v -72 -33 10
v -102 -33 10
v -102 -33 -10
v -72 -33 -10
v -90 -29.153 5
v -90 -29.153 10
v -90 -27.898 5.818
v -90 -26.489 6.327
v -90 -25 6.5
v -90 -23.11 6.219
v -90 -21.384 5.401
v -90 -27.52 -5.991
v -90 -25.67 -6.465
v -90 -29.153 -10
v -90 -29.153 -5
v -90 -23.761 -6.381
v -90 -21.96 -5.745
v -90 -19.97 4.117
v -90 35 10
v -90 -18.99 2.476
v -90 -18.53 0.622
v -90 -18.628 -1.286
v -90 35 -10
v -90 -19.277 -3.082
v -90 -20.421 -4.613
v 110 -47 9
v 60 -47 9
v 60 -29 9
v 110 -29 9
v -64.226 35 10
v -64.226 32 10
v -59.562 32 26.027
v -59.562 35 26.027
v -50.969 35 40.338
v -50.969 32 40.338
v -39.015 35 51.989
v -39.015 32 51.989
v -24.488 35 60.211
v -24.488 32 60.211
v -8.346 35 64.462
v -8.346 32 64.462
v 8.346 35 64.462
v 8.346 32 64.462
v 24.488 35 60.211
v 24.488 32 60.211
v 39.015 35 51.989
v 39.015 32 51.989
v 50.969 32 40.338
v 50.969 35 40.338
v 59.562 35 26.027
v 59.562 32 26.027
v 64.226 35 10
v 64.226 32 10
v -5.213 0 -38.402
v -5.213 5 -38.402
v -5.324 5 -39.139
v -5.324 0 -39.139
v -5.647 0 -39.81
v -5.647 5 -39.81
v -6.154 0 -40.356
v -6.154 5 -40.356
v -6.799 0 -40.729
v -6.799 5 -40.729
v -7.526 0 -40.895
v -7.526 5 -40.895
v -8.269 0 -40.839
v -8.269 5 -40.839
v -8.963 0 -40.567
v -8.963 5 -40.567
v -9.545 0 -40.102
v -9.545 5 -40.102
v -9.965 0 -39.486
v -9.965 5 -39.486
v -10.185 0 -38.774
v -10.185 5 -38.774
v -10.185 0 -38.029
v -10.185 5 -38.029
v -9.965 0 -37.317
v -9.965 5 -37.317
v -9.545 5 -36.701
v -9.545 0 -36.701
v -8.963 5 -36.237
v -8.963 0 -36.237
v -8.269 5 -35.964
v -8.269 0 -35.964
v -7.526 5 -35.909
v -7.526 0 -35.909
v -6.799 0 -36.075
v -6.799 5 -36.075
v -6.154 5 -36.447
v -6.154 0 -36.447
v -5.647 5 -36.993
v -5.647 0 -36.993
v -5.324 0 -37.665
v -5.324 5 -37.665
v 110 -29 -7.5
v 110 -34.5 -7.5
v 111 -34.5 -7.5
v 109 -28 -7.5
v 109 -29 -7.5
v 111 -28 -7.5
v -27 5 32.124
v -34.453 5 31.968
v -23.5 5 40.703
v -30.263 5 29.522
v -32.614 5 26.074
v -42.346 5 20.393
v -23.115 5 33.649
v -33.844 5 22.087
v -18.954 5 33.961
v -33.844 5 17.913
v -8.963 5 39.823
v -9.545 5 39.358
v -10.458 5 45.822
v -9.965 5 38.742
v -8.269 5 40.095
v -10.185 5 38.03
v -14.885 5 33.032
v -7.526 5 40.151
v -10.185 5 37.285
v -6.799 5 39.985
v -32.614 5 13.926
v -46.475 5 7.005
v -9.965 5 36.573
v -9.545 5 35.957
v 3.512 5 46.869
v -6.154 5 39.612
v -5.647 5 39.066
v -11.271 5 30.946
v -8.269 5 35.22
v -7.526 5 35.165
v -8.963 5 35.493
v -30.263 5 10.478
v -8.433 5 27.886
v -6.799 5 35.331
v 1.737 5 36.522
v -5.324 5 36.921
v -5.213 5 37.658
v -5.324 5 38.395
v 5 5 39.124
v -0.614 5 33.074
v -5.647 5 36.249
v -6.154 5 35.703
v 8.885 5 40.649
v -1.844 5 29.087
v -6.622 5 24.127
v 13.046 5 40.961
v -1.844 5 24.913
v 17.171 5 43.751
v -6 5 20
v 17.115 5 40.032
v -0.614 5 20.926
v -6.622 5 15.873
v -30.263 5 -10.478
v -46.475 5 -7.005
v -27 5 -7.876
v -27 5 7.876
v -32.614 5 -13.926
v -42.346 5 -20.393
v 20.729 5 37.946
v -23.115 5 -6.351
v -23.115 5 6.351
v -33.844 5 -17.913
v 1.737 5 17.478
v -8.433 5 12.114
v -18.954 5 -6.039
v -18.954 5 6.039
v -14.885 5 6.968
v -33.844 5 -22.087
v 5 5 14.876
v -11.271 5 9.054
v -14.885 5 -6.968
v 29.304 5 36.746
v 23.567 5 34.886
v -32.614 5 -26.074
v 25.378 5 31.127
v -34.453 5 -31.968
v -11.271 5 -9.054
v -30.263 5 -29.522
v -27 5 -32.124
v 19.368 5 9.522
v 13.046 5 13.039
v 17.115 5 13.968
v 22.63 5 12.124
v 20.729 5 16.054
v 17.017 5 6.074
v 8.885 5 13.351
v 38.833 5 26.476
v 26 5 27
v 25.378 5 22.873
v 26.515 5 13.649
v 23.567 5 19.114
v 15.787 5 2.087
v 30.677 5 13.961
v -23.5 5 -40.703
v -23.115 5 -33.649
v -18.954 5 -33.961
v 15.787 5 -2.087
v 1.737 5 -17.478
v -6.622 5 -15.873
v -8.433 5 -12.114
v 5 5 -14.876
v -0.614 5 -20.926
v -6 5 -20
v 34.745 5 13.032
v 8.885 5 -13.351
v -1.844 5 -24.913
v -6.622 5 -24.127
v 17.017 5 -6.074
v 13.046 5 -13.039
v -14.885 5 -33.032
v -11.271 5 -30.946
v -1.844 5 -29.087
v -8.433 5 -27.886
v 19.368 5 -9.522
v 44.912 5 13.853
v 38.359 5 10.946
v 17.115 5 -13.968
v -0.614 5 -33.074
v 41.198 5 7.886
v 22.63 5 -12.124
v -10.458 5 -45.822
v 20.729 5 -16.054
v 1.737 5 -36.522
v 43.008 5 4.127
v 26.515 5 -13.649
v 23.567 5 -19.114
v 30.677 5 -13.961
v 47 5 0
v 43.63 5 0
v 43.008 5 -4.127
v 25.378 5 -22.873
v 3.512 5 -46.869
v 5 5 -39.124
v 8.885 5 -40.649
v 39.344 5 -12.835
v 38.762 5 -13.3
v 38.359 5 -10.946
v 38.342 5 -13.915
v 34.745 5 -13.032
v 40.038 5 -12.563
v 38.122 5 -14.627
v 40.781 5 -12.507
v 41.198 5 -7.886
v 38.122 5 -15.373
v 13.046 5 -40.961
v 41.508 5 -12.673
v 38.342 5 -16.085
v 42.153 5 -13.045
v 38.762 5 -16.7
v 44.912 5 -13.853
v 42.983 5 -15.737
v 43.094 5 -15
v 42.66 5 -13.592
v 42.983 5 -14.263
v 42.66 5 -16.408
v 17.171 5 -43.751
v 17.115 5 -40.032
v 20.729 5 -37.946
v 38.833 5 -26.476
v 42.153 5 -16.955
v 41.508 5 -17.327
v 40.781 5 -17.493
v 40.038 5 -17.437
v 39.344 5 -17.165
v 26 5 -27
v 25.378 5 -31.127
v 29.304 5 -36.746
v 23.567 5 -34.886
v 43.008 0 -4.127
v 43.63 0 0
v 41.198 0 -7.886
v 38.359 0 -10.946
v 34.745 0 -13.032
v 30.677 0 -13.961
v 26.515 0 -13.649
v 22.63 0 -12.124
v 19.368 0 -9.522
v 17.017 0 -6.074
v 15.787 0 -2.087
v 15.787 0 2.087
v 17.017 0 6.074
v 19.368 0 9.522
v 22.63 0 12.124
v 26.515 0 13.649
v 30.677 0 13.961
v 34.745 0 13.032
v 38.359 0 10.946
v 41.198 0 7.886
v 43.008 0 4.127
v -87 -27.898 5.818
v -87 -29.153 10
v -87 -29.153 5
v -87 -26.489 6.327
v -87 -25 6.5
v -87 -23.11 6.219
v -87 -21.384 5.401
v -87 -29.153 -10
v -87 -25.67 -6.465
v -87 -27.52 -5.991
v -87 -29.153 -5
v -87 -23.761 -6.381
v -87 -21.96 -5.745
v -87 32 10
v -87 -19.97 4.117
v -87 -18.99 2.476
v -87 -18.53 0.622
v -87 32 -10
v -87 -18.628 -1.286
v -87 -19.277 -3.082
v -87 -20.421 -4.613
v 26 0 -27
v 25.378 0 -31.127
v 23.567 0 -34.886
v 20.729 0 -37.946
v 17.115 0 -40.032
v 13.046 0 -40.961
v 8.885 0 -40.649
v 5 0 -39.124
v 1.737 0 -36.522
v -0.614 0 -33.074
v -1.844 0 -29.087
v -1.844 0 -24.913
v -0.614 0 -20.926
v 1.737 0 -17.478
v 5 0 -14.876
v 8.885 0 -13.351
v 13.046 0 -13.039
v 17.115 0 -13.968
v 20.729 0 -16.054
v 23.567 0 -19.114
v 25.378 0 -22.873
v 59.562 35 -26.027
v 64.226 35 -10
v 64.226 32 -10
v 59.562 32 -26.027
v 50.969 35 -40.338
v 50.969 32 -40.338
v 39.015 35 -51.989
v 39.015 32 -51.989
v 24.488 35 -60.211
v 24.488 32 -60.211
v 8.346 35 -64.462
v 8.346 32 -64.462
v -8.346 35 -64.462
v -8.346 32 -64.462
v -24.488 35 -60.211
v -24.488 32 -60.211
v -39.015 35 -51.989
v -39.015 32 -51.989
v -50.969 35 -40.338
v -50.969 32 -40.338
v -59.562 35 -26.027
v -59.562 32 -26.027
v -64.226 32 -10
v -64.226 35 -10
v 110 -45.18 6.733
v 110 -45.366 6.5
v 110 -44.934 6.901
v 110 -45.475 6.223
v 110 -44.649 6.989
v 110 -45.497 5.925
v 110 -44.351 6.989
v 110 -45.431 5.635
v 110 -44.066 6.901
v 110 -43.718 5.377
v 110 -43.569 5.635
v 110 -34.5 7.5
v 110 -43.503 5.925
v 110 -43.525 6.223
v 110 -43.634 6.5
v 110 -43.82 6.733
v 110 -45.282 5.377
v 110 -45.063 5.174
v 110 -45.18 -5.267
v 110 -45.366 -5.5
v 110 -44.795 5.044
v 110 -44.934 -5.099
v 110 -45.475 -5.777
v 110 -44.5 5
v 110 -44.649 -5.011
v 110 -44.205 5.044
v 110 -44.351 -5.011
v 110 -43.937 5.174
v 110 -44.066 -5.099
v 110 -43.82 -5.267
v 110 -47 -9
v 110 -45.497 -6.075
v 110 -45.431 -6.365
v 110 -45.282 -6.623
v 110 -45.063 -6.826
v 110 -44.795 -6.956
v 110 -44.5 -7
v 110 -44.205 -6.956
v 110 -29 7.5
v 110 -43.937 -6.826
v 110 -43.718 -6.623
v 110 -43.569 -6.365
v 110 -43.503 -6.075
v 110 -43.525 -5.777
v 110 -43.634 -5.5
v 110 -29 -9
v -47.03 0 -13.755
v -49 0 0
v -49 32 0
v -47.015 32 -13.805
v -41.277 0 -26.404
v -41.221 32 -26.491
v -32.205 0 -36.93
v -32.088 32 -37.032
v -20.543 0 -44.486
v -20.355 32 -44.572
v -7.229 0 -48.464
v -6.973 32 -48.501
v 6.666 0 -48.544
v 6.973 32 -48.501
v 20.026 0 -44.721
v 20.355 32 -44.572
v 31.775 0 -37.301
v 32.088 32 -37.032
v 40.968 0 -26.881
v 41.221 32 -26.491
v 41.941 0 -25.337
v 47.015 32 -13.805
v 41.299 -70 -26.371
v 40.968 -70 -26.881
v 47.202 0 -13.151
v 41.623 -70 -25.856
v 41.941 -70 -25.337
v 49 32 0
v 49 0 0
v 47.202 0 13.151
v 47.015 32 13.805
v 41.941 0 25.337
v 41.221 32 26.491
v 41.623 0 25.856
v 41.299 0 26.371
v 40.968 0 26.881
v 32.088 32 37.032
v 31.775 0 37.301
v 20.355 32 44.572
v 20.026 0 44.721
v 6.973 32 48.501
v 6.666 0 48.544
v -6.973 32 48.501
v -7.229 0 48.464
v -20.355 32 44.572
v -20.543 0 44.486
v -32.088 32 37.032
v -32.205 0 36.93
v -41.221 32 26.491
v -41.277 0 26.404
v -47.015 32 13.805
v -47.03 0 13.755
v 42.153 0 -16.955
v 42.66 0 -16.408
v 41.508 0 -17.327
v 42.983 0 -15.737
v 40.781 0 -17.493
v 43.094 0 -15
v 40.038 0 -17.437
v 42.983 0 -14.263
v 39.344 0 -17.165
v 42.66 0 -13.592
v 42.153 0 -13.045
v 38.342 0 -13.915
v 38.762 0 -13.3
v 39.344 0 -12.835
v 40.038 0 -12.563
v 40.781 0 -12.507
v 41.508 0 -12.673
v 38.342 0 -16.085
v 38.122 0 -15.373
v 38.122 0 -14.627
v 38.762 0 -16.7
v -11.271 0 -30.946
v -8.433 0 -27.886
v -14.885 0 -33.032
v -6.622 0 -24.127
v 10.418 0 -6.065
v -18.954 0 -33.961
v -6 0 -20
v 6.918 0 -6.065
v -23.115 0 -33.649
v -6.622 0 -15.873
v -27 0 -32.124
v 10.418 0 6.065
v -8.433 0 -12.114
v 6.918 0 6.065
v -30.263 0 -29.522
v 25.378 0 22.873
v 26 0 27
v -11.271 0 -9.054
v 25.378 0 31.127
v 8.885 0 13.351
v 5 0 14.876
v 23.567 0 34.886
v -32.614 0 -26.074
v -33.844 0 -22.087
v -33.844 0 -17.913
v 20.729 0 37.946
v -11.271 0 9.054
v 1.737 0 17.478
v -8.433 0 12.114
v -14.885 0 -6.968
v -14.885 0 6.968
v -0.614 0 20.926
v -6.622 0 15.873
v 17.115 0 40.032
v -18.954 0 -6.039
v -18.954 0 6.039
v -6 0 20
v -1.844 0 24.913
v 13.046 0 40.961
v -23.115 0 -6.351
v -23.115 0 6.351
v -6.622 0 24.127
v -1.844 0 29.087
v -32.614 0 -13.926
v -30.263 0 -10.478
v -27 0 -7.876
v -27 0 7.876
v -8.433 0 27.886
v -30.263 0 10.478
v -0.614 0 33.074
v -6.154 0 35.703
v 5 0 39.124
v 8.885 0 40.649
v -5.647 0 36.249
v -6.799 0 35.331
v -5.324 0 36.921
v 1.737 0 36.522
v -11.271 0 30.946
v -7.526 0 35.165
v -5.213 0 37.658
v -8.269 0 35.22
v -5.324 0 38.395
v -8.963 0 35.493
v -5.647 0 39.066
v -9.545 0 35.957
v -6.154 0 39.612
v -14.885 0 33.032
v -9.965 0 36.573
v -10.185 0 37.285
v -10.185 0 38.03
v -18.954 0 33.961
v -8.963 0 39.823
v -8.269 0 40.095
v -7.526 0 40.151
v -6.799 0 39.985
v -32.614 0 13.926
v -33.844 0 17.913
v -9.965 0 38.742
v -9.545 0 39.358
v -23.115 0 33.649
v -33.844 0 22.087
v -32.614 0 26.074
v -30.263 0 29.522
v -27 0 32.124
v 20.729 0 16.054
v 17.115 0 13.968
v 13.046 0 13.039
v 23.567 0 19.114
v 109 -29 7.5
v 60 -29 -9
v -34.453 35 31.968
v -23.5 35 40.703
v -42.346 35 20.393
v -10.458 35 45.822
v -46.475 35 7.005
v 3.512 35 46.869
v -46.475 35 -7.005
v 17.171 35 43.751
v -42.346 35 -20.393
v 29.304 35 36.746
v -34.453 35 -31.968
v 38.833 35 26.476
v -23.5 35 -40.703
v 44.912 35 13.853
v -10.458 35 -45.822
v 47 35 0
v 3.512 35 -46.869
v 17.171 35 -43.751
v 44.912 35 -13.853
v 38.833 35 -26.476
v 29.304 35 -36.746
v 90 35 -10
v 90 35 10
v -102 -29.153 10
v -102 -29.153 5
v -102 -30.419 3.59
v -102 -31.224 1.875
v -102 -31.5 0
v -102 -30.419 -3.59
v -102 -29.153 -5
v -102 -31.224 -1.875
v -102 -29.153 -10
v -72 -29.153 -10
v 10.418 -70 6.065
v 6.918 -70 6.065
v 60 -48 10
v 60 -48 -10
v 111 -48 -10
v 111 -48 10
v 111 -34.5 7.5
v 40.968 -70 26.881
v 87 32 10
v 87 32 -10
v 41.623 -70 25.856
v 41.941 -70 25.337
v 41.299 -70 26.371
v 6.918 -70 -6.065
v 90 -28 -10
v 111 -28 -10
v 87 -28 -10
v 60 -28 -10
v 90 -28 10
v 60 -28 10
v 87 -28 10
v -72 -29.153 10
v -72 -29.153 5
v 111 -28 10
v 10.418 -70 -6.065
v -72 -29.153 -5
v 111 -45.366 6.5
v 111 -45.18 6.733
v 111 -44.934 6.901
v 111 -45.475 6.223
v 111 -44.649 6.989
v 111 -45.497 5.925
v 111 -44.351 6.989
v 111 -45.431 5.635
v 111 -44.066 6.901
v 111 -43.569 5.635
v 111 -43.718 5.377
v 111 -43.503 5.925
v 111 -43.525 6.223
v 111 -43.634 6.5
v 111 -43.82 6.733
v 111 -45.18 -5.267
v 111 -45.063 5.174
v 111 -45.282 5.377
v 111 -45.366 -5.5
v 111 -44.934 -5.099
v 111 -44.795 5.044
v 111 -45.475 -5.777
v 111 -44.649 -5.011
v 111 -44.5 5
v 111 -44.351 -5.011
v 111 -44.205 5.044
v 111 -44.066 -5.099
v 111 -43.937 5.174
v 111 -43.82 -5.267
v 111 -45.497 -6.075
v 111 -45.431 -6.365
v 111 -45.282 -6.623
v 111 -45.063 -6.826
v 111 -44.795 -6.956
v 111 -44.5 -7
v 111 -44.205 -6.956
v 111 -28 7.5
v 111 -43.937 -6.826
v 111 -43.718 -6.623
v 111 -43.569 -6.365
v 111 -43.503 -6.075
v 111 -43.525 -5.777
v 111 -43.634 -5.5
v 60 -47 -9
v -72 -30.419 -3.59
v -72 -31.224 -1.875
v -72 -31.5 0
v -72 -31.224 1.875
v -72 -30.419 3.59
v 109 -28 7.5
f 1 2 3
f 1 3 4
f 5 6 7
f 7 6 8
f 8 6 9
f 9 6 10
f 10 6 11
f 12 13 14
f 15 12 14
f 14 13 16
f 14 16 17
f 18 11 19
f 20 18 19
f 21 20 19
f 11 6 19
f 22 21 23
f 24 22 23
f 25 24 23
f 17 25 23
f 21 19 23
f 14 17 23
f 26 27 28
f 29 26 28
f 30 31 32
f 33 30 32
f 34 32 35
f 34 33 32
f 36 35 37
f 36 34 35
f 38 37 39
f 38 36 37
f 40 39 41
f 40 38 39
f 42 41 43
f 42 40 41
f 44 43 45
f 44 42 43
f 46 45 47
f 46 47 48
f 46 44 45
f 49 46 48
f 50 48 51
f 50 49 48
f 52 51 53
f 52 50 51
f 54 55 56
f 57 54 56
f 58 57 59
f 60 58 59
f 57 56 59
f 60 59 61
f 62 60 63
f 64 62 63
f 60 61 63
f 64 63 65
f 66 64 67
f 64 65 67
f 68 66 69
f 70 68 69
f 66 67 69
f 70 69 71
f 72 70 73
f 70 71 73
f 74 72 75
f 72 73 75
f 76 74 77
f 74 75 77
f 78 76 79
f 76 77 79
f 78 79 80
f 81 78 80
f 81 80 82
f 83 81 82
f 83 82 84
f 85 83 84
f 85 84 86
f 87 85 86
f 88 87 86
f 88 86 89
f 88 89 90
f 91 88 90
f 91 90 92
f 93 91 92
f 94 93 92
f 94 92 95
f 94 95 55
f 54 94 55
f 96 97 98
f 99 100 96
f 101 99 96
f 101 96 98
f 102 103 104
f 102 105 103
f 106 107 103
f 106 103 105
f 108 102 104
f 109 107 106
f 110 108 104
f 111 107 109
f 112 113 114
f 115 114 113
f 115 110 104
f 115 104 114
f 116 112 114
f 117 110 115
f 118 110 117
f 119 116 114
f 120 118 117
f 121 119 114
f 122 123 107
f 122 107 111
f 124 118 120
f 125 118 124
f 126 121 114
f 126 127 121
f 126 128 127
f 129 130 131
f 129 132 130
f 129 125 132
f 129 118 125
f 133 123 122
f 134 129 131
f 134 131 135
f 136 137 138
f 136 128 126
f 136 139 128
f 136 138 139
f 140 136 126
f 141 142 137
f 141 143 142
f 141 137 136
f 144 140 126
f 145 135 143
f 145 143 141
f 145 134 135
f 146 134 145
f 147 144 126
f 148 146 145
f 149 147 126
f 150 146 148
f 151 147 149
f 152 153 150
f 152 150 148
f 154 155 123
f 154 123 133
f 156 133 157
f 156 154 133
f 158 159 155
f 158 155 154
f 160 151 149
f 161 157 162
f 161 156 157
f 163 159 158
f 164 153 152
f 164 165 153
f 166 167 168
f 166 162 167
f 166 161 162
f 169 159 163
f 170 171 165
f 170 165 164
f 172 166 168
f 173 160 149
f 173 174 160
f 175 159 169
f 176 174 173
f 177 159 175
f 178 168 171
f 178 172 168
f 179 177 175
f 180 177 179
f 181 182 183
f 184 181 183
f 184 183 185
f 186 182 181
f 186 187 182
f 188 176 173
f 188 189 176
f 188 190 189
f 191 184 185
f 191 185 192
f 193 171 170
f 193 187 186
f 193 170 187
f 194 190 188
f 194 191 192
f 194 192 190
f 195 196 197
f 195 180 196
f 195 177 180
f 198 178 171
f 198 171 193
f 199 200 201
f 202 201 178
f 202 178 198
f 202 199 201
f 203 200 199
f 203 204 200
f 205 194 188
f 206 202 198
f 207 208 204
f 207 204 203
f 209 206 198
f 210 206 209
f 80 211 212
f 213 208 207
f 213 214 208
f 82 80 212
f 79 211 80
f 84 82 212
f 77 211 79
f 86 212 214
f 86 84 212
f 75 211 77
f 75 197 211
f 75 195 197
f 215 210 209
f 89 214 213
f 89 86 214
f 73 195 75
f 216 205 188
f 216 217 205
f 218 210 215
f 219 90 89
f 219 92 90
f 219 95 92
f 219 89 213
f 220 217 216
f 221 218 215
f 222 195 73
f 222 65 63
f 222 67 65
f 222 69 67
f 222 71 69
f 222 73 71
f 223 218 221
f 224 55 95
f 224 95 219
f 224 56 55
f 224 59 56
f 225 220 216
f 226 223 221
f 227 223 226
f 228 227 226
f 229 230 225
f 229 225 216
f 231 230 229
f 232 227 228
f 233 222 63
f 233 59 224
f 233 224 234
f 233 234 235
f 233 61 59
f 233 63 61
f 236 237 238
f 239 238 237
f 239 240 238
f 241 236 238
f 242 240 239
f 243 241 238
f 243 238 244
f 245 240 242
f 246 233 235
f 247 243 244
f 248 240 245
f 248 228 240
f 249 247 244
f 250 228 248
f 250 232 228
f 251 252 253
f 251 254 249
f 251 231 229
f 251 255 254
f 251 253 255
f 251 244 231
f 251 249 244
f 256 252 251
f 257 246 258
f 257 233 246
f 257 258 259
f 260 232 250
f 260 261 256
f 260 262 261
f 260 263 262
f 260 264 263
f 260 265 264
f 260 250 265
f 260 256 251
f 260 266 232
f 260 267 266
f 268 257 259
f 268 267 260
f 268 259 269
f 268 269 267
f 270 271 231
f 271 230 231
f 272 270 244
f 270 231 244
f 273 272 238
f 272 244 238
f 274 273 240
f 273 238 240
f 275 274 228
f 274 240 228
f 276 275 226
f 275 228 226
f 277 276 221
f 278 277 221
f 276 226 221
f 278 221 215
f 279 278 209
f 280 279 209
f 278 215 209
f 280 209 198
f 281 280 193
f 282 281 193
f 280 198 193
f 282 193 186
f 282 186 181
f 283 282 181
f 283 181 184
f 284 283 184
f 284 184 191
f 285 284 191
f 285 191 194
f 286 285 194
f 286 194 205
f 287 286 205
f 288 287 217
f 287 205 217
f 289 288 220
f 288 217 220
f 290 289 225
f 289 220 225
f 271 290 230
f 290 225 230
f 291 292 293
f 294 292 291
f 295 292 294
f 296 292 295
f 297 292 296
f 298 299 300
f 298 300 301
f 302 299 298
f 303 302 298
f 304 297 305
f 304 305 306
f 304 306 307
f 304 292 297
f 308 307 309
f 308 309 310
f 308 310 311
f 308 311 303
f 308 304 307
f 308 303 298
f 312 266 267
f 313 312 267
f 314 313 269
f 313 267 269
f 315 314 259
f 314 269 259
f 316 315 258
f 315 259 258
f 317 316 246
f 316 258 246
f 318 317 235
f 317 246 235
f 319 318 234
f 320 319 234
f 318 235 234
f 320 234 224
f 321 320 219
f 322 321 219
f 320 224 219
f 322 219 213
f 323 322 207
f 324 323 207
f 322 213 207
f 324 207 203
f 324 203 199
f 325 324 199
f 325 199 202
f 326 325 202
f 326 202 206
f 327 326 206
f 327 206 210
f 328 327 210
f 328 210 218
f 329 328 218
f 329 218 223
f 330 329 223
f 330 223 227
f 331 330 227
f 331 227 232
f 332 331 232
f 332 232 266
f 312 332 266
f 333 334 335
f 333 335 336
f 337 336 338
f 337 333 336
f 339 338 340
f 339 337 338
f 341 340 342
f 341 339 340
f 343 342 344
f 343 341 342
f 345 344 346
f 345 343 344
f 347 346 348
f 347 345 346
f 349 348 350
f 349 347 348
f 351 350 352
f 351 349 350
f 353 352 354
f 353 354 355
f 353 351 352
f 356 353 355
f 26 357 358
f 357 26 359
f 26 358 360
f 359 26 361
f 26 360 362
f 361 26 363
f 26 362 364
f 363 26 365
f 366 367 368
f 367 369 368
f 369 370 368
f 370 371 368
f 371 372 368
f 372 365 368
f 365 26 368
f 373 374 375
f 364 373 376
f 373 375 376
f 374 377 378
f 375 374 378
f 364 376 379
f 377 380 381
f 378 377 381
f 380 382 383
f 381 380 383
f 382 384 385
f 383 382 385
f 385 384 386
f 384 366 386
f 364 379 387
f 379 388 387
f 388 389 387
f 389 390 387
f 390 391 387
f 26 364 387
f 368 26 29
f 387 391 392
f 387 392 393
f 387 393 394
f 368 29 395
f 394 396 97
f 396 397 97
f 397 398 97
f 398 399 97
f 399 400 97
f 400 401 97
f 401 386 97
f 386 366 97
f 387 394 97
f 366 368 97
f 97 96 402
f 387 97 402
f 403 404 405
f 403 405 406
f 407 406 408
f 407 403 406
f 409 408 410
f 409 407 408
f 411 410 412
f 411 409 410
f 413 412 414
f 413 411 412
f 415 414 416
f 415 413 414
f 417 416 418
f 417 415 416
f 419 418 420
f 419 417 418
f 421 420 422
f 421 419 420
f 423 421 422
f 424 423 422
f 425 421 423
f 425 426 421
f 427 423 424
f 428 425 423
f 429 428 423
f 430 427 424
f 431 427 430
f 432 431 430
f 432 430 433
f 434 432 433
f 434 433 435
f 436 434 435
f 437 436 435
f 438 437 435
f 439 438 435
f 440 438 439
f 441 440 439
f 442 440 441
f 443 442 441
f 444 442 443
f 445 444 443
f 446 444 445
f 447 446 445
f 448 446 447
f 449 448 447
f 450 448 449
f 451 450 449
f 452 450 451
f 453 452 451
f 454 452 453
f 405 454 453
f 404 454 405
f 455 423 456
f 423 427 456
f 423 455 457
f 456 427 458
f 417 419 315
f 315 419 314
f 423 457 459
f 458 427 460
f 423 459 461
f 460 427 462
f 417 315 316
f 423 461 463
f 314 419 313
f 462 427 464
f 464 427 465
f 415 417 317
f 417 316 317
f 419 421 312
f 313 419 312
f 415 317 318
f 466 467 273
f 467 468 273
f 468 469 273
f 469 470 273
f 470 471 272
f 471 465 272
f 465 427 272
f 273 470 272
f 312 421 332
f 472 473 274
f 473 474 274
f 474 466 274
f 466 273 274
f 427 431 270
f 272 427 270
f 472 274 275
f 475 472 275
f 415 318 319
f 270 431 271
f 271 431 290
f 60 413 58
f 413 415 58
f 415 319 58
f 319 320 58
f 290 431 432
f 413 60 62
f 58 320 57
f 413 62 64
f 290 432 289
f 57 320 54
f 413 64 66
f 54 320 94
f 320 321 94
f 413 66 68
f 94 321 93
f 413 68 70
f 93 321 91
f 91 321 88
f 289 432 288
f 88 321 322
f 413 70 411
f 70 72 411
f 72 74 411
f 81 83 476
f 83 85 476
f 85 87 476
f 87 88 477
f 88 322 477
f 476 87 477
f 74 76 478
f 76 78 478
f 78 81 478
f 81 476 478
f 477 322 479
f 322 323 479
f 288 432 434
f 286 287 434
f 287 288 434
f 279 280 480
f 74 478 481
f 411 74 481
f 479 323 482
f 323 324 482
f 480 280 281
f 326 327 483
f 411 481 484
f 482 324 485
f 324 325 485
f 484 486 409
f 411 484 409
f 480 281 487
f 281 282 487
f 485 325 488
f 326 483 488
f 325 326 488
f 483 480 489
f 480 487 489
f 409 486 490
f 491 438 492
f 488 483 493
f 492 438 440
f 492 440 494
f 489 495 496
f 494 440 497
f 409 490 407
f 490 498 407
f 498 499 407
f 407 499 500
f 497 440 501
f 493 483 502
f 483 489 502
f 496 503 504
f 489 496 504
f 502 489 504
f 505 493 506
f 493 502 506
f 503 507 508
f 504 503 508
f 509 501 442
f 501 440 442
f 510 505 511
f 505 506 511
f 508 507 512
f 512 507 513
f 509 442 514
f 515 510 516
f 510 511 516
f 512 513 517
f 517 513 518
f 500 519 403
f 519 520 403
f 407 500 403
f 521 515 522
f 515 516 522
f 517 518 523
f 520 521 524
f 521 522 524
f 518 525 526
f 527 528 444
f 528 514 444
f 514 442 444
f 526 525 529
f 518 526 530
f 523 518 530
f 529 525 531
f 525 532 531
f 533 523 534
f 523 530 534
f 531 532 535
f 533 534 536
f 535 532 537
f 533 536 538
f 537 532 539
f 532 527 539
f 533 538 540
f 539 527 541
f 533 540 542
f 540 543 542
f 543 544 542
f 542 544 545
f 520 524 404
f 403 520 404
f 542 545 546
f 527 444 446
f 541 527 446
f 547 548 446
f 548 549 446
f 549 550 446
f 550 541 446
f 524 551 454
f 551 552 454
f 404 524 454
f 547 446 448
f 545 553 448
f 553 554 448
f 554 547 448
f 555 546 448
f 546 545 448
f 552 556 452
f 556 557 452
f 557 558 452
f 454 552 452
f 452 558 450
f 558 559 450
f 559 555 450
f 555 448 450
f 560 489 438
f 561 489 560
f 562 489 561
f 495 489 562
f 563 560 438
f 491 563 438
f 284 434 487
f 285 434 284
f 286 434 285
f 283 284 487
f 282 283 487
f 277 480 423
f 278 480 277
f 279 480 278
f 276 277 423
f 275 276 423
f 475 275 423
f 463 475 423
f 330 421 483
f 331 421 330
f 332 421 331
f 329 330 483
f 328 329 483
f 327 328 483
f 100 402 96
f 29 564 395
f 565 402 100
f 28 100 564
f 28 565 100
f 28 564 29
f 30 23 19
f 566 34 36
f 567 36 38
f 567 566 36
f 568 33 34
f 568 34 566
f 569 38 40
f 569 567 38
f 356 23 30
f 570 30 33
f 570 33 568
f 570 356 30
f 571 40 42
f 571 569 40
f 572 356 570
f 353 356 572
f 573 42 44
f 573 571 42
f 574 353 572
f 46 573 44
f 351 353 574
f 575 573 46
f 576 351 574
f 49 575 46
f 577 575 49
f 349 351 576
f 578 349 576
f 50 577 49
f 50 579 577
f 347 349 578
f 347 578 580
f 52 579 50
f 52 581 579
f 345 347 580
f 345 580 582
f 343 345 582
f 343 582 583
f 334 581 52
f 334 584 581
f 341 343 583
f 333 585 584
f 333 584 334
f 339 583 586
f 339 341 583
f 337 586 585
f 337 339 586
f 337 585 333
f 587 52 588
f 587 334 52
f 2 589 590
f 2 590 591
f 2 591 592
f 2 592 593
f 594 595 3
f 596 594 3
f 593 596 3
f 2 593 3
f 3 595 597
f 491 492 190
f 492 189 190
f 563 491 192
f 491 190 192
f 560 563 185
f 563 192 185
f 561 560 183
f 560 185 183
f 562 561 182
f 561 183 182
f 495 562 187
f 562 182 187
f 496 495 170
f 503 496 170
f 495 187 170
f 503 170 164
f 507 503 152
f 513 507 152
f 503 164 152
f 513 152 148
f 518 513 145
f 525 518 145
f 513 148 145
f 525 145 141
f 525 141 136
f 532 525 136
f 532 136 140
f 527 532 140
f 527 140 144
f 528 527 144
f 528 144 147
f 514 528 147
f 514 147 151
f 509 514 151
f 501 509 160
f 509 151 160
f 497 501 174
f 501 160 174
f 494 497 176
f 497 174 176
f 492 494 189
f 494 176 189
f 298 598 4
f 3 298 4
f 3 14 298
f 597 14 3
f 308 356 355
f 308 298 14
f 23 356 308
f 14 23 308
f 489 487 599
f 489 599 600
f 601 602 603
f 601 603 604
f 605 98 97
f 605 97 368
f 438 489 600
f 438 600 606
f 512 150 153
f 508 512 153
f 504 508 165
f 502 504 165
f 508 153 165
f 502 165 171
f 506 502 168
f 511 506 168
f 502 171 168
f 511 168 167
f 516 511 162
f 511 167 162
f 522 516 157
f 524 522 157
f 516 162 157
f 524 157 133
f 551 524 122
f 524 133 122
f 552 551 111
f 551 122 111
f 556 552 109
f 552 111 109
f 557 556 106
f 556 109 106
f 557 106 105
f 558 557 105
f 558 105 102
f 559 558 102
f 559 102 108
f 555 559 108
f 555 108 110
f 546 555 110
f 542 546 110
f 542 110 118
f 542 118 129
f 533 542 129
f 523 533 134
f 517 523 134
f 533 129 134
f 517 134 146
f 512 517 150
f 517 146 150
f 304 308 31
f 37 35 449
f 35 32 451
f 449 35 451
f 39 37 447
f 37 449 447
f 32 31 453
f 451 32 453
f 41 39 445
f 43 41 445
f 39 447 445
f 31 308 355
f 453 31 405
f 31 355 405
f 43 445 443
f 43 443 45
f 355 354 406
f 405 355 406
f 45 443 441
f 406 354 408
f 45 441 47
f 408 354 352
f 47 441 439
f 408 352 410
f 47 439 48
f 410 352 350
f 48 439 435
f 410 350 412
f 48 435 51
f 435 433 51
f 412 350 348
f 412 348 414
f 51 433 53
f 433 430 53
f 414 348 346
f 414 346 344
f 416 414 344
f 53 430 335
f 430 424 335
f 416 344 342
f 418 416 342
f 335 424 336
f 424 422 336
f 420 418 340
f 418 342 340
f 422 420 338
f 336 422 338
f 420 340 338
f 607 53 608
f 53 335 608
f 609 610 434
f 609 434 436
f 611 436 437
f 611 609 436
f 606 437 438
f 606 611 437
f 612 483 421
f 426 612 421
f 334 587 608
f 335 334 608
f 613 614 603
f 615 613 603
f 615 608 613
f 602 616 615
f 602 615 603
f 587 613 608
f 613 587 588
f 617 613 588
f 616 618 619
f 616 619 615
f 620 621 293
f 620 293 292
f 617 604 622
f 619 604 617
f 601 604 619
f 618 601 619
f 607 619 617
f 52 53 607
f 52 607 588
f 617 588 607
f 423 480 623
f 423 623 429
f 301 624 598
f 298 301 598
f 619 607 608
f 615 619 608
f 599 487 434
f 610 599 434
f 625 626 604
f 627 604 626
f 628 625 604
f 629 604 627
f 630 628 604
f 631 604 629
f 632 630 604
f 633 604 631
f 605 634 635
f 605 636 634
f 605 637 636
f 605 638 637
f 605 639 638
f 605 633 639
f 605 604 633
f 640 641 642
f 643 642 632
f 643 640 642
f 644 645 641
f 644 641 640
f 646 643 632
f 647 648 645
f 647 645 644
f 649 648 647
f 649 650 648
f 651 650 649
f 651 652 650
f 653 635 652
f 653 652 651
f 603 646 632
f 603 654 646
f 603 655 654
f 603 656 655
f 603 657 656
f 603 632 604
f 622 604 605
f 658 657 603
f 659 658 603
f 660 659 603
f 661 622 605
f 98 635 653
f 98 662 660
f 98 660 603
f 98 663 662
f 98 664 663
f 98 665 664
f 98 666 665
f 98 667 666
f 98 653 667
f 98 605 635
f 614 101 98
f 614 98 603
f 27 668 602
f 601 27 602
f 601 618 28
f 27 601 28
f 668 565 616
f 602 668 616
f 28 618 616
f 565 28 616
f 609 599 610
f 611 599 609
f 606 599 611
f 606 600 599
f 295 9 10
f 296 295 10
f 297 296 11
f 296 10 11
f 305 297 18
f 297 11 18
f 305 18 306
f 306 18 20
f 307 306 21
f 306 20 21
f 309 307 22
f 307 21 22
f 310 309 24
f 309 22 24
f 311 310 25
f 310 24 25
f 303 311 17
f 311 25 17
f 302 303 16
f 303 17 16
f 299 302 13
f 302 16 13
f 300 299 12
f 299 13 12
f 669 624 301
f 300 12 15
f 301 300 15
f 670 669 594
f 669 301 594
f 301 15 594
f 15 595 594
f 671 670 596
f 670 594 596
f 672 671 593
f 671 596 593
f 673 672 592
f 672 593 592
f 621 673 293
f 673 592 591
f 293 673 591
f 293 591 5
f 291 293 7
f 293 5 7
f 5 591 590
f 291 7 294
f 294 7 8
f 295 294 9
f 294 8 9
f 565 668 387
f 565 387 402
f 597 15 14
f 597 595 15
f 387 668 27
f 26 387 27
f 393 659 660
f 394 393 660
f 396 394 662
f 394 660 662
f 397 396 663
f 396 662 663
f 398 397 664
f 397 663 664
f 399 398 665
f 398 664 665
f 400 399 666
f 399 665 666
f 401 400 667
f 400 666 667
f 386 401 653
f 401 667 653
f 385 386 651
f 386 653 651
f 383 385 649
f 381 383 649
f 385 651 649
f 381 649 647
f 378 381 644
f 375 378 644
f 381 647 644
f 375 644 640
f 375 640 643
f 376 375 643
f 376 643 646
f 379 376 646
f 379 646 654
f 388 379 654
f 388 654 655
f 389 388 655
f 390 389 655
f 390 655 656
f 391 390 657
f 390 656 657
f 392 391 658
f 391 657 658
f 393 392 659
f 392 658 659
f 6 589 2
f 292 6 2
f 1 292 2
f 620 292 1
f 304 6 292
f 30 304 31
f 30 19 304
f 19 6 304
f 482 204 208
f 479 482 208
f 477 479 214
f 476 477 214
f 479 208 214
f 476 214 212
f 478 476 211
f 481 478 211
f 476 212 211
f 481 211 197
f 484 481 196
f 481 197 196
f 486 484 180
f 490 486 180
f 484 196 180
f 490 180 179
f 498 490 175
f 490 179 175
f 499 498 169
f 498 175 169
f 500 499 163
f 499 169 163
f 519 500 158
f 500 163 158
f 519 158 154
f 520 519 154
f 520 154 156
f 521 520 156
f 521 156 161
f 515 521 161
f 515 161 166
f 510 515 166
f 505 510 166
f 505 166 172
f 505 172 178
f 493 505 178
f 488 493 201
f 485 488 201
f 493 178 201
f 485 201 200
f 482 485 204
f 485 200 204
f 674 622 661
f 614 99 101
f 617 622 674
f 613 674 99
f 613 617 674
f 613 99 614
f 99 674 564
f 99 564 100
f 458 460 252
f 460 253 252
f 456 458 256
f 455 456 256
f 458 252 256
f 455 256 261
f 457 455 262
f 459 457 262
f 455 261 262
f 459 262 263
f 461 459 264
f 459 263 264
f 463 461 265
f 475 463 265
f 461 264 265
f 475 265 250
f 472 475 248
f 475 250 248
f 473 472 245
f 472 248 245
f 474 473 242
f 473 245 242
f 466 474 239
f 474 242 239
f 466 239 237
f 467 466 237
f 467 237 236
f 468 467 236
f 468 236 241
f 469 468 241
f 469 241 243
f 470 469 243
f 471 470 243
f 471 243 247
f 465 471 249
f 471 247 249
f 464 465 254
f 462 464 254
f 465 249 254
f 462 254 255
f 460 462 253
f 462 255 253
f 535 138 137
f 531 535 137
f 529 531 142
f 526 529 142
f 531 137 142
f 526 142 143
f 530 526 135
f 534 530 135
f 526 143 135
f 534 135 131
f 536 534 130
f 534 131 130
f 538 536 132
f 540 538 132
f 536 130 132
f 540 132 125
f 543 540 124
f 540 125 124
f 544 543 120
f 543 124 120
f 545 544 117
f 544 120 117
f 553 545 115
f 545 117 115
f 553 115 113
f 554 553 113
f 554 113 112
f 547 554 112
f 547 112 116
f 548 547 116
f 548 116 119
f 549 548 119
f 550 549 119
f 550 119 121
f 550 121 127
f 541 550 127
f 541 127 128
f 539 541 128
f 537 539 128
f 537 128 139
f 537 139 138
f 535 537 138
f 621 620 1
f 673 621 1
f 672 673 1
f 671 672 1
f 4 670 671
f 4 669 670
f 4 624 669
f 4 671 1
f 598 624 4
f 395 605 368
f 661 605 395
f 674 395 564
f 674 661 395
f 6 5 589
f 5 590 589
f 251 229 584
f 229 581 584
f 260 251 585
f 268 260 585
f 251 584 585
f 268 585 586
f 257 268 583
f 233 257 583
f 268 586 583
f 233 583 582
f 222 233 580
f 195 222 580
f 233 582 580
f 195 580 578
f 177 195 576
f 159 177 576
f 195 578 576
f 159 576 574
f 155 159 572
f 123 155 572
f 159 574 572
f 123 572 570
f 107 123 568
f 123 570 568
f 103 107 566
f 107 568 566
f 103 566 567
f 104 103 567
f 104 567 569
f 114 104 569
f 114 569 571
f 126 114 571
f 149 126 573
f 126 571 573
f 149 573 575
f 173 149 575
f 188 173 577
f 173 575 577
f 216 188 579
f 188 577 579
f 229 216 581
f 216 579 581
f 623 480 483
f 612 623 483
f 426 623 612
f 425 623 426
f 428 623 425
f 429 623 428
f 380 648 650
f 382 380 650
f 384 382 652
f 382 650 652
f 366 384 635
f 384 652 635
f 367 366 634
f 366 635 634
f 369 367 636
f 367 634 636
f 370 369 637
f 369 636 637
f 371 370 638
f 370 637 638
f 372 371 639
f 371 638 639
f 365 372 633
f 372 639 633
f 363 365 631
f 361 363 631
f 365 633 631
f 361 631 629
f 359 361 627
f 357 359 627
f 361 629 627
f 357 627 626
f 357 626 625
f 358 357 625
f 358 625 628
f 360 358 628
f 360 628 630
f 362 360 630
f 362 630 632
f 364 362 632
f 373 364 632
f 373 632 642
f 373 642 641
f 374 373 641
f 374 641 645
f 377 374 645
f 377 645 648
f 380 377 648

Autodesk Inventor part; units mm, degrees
sketch "Sketch1" plane through (0, 0, 0) normal (0, 1, 0) x (-1, 0, 0)
  circle A0 centre (0, 0) radius 49
  dimension "d1" = 98
extrude "Extrusion1" add sketch "Sketch1" along normal blind 35
sketch "Sketch4" plane through (0, 35, 0) normal (0, 1, 0) x (1, 0, 0)
  circle A0 centre (0, 0) radius 47
  dimension "d8" = 94
extrude "Extrusion3" cut sketch "Sketch4" against normal blind 30
sketch "Sketch6" plane through (0, 35, 0) normal (0, 1, 0) x (1, 0, 0)
  circle A0 centre (0, 0) radius 49
  circle A1 centre (0, 0) radius 65
  dimension "d13" = 98
  dimension "d14" = 130
extrude "Extrusion4" add sketch "Sketch6" against normal blind 3
sketch "Sketch7" plane through (0, 5, 0) normal (0, 1, 0) x (1, 0, 0)
  line L0 (0, 68.6) -> (0, -68.6) projected
  line L1 (68.6, 0) -> (-68.6, 0) projected
  circle A0 centre (29.6304, 0) radius 14
  circle A1 centre (29.6304, 0) radius 15
  circle A2 centre (-20, -20) radius 14
  circle A3 centre (-20, -20) radius 15
  circle A4 centre (12, -27) radius 14
  circle A5 centre (12, -27) radius 15
  circle A6 centre (-20, 20) radius 14
  circle A7 centre (-20, 20) radius 15
  circle A8 centre (12, 27) radius 14
  circle A9 centre (12, 27) radius 15
  circle A10 centre (-7.7127, -37.6577) radius 2.5
  circle A11 centre (40.5942, 15) radius 2.5
  circle A12 centre (-7.7127, 38.4017) radius 2.5
  point P0 (0, 0)
  point P1 (0, -19.7889)
  point P2 (0, -34.2111)
  point P3 (0, 34.2111)
  point P4 (0, 19.7889)
  dimension "d92" = 28
  dimension "d93" = 30
  dimension "d94" = 28
  dimension "d95" = 30
  dimension "d96" = 28
  dimension "d97" = 30
  dimension "d98" = 28
  dimension "d99" = 30
  dimension "d100" = 28
  dimension "d101" = 30
  dimension "d102" = 20
  dimension "d103" = 20
  dimension "d104" = 20
  dimension "d105" = 20
  dimension "d106" = 12
  dimension "d107" = 27
  dimension "d108" = 12
  dimension "d109" = 27
  dimension "d110" = 5
  dimension "d111" = 5
  dimension "d112" = 5
extrude "Extrusion5" cut sketch "Sketch7" against normal through all contours A8 L0 | L0 A8 | A4 L0 | L0 A4 | A0 L1 | L1 A0 | A2 | A6 | A10 | A11 | A12
sketch "Sketch9" plane through (0, 35, 0) normal (0, 1, 0) x (1, 0, 0)
  circle A0 centre (0, 0) radius 65 projected
  arc A1 (64.2262, -10) -> (64.2262, 10) centre (0, 0) ccw
  line L0 (64.2262, 10) -> (90, 10)
  line L1 (64.2262, -10) -> (90, -10)
  line L2 (90, -10) -> (90, 10)
  line L3 (121, 0) -> (-96, 0) projected
  point P0 (77.1131, 10)
  dimension "d41" = 10
  dimension "d42" = 20
  dimension "d43" = 90
extrude "Extrusion6" add sketch "Sketch9" against normal blind 3 contours L3 L2 L1 A0 | A0 L0 L2 L3
mirror "Mirror1" about plane through (0, 0, 0) normal (1, 0, 0) of "Extrusion6"
sketch "Sketch10" plane through (0, 32, 0) normal (0, -1, 0) x (1, 0, 0)
  line L0 (-90, 10) -> (-90, -10) projected
  line L1 (-90, 10) -> (-87, 10)
  line L2 (-87, 10) -> (-87, -10)
  line L3 (-87, -10) -> (-90, -10)
  line L4 (-90, -10) -> (-90, 10)
  point P0 (0, 0)
  dimension "d44" = 3
extrude "Extrusion7" add sketch "Sketch10" along normal blind 65
sketch "Sketch12" plane through (-90, 35, -10) normal (-1, 0, 0) x (0, 0, 1)
  circle A0 centre (10, -60) radius 6.5
  line L0 (20, -68) -> (0, -68) projected
  point P0 (10, -35)
  dimension "d49" = 13
  dimension "d50" = 8
extrude "Extrusion9" cut sketch "Sketch12" against normal blind 3
sketch "Sketch13" plane through (-87, 32, 10) normal (1, 0, 0) x (0, 0, -1)
  circle A0 centre (10, -57) radius 6.5 projected
  arc A1 (5, -61.1533) -> (15, -61.1533) centre (10, -57) ccw
  line L0 (10, -78.6) -> (10, 16.6) projected
  line L1 (5, -61.1533) -> (0, -61.1533)
  line L2 (0, 0) -> (0, -65) projected
  line L3 (20, 0) -> (20, -65) projected
  line L4 (0, -65) -> (20, -65)
  line L5 (20, -65) -> (20, -61.1533)
  line L6 (15, -61.1533) -> (20, -61.1533)
  point P0 (10, -32)
  dimension "d53" = 5
  dimension "d54" = 5
extrude "Extrusion10" add sketch "Sketch13" along normal blind 15 and the other way blind 15 contours L6 L3 L4 L0 A0 | L0 L4 L2 L1 A0
sketch "Sketch18" plane through (0, 0, 0) normal (0, -1, 0) x (1, 0, 0)
  circle A0 centre (0, 0) radius 49 projected
  circle A1 centre (-20, 20) radius 14 projected
  circle A2 centre (-20, -20) radius 14 projected
  line L0 (10.4184, -6.0653) -> (41.9411, -25.3366)
  line L1 (10.4184, -6.0653) -> (6.9184, -6.0653)
  line L2 (6.9184, -6.0653) -> (40.9681, -26.8814)
  arc A3 (40.8578, 27.0489) -> (39.6703, 28.7622) centre (0, 0) ccw
  arc A4 (40.9681, -26.8814) -> (41.9411, -25.3366) centre (0, 0) ccw
  line L3 (0, 0) -> (49, 0)
  line L4 (10.4184, 6.0653) -> (41.9411, 25.3366)
  line L5 (10.4184, 6.0653) -> (6.9184, 6.0653)
  line L6 (6.9184, 6.0653) -> (40.9681, 26.8814)
  arc A5 (41.9411, 25.3366) -> (40.9681, 26.8814) centre (0, 0) ccw
  dimension "d115" = 3.5
extrude "Extrusion15" add sketch "Sketch18" along normal blind 70 contours L4 L5 L6 A0 | A0 L2 L1 L0
sketch "Sketch19" plane through (0, 32, 0) normal (0, -1, 0) x (1, 0, 0)
  line L0 (90, -10) -> (64.2262, -10) projected
  line L1 (90, 10) -> (87, 10)
  line L2 (87, 10) -> (87, -10)
  line L3 (87, -10) -> (90, -10)
  line L4 (90, -10) -> (90, 10)
  point P0 (0, 0)
  dimension "d118" = 3
extrude "Extrusion16" add sketch "Sketch19" along normal blind 80
sketch "Sketch20" plane through (90, 35, 10) normal (1, 0, 0) x (0, 0, -1)
  line L0 (0, -3) -> (0, -64.1533) projected
  line L1 (20, 0) -> (20, -83) projected
  line L2 (0, -63) -> (20, -63)
  line L3 (20, -63) -> (20, -83)
  line L4 (20, -83) -> (0, -83)
  line L5 (0, -83) -> (0, -63)
  line L6 (1, -64) -> (19, -64)
  line L7 (19, -64) -> (19, -82)
  line L8 (19, -82) -> (1, -82)
  line L9 (1, -82) -> (1, -64)
  point P0 (10, -35)
  dimension "d121" = 20
  dimension "d122" = 18
  dimension "d123" = 18
  dimension "d124" = 19
  dimension "d125" = 1
extrude "Extrusion17" cut sketch "Sketch20" against normal blind 3 contours L6 L7 L8 L9
sketch "Sketch21" plane through (90, 35, 10) normal (1, 0, 0) x (0, 0, -1)
  line L0 (19, -64) -> (1, -64) projected
  line L1 (19, -82) -> (19, -64) projected
  line L2 (1, -64) -> (19, -64)
  line L3 (19, -64) -> (19, -82)
  line L4 (19, -82) -> (1, -82)
  line L5 (1, -82) -> (1, -64)
  line L6 (0, -3) -> (0, -83) projected
  line L7 (0, -83) -> (20, -83) projected
  line L8 (0, -63) -> (20, -63)
  line L9 (20, -63) -> (20, -83)
  line L10 (20, -83) -> (0, -83)
  line L11 (0, -83) -> (0, -63)
  point P0 (10, -35)
  dimension "d128" = 20
extrude "Extrusion18" add sketch "Sketch21" along normal blind 20 and the other way blind 30
sketch "Sketch22" plane through (110, 35, 10) normal (1, 0, 0) x (0, 0, -1)
  line L0 (0, -63) -> (20, -63) projected
  line L1 (20, -63) -> (20, -83) projected
  line L2 (0, -63) -> (20, -63)
  line L3 (20, -63) -> (20, -83)
  line L4 (20, -83) -> (0, -83)
  line L5 (0, -83) -> (0, -63)
  point P0 (10, -35)
extrude "Extrusion19" add sketch "Sketch22" along normal blind 1
sketch "Sketch23" plane through (111, 35, 10) normal (1, 0, 0) x (0, 0, -1)
  line L0 (2.5, -65.5) -> (17.5, -65.5)
  line L1 (17.5, -65.5) -> (17.5, -69.5)
  line L2 (17.5, -69.5) -> (2.5, -69.5)
  line L3 (2.5, -69.5) -> (2.5, -65.5)
  line L4 (10, -126) -> (10, 21) projected
  line L5 (0, -83) -> (20, -83) projected
  circle A0 centre (16, -79.5) radius 1
  line L6 (20, -83) -> (20, -63) projected
  circle A1 centre (4, -79.5) radius 1
  line L7 (0, -63) -> (0, -83) projected
  point P0 (10, -35)
  point P1 (17.5, -67.5)
  dimension "d135" = 15
  dimension "d136" = 7.5
  dimension "d137" = 4
  dimension "d138" = 17.5
  dimension "d139" = 10
  dimension "d140" = 2
  dimension "d141" = 4
  dimension "d142" = 2
  dimension "d143" = 10
  dimension "d144" = 4
extrude "Extrusion20" cut sketch "Sketch23" against normal blind 1
sketch "Sketch24" plane through (90, -28, 10) normal (0, 1, 0) x (1, 0, 0)
  line L0 (21, 20) -> (21, 0) projected
  line L1 (19, 17.5) -> (21, 17.5)
  line L2 (21, 17.5) -> (21, 2.5)
  line L3 (21, 2.5) -> (19, 2.5)
  line L4 (19, 2.5) -> (19, 17.5)
  line L5 (0, 0) -> (21, 0) projected
  point P0 (-90, 10)
  dimension "d147" = 15
  dimension "d148" = 2.5
  dimension "d149" = 2
extrude "Extrusion21" cut sketch "Sketch24" against normal blind 4
properties part number "VialHolder"
